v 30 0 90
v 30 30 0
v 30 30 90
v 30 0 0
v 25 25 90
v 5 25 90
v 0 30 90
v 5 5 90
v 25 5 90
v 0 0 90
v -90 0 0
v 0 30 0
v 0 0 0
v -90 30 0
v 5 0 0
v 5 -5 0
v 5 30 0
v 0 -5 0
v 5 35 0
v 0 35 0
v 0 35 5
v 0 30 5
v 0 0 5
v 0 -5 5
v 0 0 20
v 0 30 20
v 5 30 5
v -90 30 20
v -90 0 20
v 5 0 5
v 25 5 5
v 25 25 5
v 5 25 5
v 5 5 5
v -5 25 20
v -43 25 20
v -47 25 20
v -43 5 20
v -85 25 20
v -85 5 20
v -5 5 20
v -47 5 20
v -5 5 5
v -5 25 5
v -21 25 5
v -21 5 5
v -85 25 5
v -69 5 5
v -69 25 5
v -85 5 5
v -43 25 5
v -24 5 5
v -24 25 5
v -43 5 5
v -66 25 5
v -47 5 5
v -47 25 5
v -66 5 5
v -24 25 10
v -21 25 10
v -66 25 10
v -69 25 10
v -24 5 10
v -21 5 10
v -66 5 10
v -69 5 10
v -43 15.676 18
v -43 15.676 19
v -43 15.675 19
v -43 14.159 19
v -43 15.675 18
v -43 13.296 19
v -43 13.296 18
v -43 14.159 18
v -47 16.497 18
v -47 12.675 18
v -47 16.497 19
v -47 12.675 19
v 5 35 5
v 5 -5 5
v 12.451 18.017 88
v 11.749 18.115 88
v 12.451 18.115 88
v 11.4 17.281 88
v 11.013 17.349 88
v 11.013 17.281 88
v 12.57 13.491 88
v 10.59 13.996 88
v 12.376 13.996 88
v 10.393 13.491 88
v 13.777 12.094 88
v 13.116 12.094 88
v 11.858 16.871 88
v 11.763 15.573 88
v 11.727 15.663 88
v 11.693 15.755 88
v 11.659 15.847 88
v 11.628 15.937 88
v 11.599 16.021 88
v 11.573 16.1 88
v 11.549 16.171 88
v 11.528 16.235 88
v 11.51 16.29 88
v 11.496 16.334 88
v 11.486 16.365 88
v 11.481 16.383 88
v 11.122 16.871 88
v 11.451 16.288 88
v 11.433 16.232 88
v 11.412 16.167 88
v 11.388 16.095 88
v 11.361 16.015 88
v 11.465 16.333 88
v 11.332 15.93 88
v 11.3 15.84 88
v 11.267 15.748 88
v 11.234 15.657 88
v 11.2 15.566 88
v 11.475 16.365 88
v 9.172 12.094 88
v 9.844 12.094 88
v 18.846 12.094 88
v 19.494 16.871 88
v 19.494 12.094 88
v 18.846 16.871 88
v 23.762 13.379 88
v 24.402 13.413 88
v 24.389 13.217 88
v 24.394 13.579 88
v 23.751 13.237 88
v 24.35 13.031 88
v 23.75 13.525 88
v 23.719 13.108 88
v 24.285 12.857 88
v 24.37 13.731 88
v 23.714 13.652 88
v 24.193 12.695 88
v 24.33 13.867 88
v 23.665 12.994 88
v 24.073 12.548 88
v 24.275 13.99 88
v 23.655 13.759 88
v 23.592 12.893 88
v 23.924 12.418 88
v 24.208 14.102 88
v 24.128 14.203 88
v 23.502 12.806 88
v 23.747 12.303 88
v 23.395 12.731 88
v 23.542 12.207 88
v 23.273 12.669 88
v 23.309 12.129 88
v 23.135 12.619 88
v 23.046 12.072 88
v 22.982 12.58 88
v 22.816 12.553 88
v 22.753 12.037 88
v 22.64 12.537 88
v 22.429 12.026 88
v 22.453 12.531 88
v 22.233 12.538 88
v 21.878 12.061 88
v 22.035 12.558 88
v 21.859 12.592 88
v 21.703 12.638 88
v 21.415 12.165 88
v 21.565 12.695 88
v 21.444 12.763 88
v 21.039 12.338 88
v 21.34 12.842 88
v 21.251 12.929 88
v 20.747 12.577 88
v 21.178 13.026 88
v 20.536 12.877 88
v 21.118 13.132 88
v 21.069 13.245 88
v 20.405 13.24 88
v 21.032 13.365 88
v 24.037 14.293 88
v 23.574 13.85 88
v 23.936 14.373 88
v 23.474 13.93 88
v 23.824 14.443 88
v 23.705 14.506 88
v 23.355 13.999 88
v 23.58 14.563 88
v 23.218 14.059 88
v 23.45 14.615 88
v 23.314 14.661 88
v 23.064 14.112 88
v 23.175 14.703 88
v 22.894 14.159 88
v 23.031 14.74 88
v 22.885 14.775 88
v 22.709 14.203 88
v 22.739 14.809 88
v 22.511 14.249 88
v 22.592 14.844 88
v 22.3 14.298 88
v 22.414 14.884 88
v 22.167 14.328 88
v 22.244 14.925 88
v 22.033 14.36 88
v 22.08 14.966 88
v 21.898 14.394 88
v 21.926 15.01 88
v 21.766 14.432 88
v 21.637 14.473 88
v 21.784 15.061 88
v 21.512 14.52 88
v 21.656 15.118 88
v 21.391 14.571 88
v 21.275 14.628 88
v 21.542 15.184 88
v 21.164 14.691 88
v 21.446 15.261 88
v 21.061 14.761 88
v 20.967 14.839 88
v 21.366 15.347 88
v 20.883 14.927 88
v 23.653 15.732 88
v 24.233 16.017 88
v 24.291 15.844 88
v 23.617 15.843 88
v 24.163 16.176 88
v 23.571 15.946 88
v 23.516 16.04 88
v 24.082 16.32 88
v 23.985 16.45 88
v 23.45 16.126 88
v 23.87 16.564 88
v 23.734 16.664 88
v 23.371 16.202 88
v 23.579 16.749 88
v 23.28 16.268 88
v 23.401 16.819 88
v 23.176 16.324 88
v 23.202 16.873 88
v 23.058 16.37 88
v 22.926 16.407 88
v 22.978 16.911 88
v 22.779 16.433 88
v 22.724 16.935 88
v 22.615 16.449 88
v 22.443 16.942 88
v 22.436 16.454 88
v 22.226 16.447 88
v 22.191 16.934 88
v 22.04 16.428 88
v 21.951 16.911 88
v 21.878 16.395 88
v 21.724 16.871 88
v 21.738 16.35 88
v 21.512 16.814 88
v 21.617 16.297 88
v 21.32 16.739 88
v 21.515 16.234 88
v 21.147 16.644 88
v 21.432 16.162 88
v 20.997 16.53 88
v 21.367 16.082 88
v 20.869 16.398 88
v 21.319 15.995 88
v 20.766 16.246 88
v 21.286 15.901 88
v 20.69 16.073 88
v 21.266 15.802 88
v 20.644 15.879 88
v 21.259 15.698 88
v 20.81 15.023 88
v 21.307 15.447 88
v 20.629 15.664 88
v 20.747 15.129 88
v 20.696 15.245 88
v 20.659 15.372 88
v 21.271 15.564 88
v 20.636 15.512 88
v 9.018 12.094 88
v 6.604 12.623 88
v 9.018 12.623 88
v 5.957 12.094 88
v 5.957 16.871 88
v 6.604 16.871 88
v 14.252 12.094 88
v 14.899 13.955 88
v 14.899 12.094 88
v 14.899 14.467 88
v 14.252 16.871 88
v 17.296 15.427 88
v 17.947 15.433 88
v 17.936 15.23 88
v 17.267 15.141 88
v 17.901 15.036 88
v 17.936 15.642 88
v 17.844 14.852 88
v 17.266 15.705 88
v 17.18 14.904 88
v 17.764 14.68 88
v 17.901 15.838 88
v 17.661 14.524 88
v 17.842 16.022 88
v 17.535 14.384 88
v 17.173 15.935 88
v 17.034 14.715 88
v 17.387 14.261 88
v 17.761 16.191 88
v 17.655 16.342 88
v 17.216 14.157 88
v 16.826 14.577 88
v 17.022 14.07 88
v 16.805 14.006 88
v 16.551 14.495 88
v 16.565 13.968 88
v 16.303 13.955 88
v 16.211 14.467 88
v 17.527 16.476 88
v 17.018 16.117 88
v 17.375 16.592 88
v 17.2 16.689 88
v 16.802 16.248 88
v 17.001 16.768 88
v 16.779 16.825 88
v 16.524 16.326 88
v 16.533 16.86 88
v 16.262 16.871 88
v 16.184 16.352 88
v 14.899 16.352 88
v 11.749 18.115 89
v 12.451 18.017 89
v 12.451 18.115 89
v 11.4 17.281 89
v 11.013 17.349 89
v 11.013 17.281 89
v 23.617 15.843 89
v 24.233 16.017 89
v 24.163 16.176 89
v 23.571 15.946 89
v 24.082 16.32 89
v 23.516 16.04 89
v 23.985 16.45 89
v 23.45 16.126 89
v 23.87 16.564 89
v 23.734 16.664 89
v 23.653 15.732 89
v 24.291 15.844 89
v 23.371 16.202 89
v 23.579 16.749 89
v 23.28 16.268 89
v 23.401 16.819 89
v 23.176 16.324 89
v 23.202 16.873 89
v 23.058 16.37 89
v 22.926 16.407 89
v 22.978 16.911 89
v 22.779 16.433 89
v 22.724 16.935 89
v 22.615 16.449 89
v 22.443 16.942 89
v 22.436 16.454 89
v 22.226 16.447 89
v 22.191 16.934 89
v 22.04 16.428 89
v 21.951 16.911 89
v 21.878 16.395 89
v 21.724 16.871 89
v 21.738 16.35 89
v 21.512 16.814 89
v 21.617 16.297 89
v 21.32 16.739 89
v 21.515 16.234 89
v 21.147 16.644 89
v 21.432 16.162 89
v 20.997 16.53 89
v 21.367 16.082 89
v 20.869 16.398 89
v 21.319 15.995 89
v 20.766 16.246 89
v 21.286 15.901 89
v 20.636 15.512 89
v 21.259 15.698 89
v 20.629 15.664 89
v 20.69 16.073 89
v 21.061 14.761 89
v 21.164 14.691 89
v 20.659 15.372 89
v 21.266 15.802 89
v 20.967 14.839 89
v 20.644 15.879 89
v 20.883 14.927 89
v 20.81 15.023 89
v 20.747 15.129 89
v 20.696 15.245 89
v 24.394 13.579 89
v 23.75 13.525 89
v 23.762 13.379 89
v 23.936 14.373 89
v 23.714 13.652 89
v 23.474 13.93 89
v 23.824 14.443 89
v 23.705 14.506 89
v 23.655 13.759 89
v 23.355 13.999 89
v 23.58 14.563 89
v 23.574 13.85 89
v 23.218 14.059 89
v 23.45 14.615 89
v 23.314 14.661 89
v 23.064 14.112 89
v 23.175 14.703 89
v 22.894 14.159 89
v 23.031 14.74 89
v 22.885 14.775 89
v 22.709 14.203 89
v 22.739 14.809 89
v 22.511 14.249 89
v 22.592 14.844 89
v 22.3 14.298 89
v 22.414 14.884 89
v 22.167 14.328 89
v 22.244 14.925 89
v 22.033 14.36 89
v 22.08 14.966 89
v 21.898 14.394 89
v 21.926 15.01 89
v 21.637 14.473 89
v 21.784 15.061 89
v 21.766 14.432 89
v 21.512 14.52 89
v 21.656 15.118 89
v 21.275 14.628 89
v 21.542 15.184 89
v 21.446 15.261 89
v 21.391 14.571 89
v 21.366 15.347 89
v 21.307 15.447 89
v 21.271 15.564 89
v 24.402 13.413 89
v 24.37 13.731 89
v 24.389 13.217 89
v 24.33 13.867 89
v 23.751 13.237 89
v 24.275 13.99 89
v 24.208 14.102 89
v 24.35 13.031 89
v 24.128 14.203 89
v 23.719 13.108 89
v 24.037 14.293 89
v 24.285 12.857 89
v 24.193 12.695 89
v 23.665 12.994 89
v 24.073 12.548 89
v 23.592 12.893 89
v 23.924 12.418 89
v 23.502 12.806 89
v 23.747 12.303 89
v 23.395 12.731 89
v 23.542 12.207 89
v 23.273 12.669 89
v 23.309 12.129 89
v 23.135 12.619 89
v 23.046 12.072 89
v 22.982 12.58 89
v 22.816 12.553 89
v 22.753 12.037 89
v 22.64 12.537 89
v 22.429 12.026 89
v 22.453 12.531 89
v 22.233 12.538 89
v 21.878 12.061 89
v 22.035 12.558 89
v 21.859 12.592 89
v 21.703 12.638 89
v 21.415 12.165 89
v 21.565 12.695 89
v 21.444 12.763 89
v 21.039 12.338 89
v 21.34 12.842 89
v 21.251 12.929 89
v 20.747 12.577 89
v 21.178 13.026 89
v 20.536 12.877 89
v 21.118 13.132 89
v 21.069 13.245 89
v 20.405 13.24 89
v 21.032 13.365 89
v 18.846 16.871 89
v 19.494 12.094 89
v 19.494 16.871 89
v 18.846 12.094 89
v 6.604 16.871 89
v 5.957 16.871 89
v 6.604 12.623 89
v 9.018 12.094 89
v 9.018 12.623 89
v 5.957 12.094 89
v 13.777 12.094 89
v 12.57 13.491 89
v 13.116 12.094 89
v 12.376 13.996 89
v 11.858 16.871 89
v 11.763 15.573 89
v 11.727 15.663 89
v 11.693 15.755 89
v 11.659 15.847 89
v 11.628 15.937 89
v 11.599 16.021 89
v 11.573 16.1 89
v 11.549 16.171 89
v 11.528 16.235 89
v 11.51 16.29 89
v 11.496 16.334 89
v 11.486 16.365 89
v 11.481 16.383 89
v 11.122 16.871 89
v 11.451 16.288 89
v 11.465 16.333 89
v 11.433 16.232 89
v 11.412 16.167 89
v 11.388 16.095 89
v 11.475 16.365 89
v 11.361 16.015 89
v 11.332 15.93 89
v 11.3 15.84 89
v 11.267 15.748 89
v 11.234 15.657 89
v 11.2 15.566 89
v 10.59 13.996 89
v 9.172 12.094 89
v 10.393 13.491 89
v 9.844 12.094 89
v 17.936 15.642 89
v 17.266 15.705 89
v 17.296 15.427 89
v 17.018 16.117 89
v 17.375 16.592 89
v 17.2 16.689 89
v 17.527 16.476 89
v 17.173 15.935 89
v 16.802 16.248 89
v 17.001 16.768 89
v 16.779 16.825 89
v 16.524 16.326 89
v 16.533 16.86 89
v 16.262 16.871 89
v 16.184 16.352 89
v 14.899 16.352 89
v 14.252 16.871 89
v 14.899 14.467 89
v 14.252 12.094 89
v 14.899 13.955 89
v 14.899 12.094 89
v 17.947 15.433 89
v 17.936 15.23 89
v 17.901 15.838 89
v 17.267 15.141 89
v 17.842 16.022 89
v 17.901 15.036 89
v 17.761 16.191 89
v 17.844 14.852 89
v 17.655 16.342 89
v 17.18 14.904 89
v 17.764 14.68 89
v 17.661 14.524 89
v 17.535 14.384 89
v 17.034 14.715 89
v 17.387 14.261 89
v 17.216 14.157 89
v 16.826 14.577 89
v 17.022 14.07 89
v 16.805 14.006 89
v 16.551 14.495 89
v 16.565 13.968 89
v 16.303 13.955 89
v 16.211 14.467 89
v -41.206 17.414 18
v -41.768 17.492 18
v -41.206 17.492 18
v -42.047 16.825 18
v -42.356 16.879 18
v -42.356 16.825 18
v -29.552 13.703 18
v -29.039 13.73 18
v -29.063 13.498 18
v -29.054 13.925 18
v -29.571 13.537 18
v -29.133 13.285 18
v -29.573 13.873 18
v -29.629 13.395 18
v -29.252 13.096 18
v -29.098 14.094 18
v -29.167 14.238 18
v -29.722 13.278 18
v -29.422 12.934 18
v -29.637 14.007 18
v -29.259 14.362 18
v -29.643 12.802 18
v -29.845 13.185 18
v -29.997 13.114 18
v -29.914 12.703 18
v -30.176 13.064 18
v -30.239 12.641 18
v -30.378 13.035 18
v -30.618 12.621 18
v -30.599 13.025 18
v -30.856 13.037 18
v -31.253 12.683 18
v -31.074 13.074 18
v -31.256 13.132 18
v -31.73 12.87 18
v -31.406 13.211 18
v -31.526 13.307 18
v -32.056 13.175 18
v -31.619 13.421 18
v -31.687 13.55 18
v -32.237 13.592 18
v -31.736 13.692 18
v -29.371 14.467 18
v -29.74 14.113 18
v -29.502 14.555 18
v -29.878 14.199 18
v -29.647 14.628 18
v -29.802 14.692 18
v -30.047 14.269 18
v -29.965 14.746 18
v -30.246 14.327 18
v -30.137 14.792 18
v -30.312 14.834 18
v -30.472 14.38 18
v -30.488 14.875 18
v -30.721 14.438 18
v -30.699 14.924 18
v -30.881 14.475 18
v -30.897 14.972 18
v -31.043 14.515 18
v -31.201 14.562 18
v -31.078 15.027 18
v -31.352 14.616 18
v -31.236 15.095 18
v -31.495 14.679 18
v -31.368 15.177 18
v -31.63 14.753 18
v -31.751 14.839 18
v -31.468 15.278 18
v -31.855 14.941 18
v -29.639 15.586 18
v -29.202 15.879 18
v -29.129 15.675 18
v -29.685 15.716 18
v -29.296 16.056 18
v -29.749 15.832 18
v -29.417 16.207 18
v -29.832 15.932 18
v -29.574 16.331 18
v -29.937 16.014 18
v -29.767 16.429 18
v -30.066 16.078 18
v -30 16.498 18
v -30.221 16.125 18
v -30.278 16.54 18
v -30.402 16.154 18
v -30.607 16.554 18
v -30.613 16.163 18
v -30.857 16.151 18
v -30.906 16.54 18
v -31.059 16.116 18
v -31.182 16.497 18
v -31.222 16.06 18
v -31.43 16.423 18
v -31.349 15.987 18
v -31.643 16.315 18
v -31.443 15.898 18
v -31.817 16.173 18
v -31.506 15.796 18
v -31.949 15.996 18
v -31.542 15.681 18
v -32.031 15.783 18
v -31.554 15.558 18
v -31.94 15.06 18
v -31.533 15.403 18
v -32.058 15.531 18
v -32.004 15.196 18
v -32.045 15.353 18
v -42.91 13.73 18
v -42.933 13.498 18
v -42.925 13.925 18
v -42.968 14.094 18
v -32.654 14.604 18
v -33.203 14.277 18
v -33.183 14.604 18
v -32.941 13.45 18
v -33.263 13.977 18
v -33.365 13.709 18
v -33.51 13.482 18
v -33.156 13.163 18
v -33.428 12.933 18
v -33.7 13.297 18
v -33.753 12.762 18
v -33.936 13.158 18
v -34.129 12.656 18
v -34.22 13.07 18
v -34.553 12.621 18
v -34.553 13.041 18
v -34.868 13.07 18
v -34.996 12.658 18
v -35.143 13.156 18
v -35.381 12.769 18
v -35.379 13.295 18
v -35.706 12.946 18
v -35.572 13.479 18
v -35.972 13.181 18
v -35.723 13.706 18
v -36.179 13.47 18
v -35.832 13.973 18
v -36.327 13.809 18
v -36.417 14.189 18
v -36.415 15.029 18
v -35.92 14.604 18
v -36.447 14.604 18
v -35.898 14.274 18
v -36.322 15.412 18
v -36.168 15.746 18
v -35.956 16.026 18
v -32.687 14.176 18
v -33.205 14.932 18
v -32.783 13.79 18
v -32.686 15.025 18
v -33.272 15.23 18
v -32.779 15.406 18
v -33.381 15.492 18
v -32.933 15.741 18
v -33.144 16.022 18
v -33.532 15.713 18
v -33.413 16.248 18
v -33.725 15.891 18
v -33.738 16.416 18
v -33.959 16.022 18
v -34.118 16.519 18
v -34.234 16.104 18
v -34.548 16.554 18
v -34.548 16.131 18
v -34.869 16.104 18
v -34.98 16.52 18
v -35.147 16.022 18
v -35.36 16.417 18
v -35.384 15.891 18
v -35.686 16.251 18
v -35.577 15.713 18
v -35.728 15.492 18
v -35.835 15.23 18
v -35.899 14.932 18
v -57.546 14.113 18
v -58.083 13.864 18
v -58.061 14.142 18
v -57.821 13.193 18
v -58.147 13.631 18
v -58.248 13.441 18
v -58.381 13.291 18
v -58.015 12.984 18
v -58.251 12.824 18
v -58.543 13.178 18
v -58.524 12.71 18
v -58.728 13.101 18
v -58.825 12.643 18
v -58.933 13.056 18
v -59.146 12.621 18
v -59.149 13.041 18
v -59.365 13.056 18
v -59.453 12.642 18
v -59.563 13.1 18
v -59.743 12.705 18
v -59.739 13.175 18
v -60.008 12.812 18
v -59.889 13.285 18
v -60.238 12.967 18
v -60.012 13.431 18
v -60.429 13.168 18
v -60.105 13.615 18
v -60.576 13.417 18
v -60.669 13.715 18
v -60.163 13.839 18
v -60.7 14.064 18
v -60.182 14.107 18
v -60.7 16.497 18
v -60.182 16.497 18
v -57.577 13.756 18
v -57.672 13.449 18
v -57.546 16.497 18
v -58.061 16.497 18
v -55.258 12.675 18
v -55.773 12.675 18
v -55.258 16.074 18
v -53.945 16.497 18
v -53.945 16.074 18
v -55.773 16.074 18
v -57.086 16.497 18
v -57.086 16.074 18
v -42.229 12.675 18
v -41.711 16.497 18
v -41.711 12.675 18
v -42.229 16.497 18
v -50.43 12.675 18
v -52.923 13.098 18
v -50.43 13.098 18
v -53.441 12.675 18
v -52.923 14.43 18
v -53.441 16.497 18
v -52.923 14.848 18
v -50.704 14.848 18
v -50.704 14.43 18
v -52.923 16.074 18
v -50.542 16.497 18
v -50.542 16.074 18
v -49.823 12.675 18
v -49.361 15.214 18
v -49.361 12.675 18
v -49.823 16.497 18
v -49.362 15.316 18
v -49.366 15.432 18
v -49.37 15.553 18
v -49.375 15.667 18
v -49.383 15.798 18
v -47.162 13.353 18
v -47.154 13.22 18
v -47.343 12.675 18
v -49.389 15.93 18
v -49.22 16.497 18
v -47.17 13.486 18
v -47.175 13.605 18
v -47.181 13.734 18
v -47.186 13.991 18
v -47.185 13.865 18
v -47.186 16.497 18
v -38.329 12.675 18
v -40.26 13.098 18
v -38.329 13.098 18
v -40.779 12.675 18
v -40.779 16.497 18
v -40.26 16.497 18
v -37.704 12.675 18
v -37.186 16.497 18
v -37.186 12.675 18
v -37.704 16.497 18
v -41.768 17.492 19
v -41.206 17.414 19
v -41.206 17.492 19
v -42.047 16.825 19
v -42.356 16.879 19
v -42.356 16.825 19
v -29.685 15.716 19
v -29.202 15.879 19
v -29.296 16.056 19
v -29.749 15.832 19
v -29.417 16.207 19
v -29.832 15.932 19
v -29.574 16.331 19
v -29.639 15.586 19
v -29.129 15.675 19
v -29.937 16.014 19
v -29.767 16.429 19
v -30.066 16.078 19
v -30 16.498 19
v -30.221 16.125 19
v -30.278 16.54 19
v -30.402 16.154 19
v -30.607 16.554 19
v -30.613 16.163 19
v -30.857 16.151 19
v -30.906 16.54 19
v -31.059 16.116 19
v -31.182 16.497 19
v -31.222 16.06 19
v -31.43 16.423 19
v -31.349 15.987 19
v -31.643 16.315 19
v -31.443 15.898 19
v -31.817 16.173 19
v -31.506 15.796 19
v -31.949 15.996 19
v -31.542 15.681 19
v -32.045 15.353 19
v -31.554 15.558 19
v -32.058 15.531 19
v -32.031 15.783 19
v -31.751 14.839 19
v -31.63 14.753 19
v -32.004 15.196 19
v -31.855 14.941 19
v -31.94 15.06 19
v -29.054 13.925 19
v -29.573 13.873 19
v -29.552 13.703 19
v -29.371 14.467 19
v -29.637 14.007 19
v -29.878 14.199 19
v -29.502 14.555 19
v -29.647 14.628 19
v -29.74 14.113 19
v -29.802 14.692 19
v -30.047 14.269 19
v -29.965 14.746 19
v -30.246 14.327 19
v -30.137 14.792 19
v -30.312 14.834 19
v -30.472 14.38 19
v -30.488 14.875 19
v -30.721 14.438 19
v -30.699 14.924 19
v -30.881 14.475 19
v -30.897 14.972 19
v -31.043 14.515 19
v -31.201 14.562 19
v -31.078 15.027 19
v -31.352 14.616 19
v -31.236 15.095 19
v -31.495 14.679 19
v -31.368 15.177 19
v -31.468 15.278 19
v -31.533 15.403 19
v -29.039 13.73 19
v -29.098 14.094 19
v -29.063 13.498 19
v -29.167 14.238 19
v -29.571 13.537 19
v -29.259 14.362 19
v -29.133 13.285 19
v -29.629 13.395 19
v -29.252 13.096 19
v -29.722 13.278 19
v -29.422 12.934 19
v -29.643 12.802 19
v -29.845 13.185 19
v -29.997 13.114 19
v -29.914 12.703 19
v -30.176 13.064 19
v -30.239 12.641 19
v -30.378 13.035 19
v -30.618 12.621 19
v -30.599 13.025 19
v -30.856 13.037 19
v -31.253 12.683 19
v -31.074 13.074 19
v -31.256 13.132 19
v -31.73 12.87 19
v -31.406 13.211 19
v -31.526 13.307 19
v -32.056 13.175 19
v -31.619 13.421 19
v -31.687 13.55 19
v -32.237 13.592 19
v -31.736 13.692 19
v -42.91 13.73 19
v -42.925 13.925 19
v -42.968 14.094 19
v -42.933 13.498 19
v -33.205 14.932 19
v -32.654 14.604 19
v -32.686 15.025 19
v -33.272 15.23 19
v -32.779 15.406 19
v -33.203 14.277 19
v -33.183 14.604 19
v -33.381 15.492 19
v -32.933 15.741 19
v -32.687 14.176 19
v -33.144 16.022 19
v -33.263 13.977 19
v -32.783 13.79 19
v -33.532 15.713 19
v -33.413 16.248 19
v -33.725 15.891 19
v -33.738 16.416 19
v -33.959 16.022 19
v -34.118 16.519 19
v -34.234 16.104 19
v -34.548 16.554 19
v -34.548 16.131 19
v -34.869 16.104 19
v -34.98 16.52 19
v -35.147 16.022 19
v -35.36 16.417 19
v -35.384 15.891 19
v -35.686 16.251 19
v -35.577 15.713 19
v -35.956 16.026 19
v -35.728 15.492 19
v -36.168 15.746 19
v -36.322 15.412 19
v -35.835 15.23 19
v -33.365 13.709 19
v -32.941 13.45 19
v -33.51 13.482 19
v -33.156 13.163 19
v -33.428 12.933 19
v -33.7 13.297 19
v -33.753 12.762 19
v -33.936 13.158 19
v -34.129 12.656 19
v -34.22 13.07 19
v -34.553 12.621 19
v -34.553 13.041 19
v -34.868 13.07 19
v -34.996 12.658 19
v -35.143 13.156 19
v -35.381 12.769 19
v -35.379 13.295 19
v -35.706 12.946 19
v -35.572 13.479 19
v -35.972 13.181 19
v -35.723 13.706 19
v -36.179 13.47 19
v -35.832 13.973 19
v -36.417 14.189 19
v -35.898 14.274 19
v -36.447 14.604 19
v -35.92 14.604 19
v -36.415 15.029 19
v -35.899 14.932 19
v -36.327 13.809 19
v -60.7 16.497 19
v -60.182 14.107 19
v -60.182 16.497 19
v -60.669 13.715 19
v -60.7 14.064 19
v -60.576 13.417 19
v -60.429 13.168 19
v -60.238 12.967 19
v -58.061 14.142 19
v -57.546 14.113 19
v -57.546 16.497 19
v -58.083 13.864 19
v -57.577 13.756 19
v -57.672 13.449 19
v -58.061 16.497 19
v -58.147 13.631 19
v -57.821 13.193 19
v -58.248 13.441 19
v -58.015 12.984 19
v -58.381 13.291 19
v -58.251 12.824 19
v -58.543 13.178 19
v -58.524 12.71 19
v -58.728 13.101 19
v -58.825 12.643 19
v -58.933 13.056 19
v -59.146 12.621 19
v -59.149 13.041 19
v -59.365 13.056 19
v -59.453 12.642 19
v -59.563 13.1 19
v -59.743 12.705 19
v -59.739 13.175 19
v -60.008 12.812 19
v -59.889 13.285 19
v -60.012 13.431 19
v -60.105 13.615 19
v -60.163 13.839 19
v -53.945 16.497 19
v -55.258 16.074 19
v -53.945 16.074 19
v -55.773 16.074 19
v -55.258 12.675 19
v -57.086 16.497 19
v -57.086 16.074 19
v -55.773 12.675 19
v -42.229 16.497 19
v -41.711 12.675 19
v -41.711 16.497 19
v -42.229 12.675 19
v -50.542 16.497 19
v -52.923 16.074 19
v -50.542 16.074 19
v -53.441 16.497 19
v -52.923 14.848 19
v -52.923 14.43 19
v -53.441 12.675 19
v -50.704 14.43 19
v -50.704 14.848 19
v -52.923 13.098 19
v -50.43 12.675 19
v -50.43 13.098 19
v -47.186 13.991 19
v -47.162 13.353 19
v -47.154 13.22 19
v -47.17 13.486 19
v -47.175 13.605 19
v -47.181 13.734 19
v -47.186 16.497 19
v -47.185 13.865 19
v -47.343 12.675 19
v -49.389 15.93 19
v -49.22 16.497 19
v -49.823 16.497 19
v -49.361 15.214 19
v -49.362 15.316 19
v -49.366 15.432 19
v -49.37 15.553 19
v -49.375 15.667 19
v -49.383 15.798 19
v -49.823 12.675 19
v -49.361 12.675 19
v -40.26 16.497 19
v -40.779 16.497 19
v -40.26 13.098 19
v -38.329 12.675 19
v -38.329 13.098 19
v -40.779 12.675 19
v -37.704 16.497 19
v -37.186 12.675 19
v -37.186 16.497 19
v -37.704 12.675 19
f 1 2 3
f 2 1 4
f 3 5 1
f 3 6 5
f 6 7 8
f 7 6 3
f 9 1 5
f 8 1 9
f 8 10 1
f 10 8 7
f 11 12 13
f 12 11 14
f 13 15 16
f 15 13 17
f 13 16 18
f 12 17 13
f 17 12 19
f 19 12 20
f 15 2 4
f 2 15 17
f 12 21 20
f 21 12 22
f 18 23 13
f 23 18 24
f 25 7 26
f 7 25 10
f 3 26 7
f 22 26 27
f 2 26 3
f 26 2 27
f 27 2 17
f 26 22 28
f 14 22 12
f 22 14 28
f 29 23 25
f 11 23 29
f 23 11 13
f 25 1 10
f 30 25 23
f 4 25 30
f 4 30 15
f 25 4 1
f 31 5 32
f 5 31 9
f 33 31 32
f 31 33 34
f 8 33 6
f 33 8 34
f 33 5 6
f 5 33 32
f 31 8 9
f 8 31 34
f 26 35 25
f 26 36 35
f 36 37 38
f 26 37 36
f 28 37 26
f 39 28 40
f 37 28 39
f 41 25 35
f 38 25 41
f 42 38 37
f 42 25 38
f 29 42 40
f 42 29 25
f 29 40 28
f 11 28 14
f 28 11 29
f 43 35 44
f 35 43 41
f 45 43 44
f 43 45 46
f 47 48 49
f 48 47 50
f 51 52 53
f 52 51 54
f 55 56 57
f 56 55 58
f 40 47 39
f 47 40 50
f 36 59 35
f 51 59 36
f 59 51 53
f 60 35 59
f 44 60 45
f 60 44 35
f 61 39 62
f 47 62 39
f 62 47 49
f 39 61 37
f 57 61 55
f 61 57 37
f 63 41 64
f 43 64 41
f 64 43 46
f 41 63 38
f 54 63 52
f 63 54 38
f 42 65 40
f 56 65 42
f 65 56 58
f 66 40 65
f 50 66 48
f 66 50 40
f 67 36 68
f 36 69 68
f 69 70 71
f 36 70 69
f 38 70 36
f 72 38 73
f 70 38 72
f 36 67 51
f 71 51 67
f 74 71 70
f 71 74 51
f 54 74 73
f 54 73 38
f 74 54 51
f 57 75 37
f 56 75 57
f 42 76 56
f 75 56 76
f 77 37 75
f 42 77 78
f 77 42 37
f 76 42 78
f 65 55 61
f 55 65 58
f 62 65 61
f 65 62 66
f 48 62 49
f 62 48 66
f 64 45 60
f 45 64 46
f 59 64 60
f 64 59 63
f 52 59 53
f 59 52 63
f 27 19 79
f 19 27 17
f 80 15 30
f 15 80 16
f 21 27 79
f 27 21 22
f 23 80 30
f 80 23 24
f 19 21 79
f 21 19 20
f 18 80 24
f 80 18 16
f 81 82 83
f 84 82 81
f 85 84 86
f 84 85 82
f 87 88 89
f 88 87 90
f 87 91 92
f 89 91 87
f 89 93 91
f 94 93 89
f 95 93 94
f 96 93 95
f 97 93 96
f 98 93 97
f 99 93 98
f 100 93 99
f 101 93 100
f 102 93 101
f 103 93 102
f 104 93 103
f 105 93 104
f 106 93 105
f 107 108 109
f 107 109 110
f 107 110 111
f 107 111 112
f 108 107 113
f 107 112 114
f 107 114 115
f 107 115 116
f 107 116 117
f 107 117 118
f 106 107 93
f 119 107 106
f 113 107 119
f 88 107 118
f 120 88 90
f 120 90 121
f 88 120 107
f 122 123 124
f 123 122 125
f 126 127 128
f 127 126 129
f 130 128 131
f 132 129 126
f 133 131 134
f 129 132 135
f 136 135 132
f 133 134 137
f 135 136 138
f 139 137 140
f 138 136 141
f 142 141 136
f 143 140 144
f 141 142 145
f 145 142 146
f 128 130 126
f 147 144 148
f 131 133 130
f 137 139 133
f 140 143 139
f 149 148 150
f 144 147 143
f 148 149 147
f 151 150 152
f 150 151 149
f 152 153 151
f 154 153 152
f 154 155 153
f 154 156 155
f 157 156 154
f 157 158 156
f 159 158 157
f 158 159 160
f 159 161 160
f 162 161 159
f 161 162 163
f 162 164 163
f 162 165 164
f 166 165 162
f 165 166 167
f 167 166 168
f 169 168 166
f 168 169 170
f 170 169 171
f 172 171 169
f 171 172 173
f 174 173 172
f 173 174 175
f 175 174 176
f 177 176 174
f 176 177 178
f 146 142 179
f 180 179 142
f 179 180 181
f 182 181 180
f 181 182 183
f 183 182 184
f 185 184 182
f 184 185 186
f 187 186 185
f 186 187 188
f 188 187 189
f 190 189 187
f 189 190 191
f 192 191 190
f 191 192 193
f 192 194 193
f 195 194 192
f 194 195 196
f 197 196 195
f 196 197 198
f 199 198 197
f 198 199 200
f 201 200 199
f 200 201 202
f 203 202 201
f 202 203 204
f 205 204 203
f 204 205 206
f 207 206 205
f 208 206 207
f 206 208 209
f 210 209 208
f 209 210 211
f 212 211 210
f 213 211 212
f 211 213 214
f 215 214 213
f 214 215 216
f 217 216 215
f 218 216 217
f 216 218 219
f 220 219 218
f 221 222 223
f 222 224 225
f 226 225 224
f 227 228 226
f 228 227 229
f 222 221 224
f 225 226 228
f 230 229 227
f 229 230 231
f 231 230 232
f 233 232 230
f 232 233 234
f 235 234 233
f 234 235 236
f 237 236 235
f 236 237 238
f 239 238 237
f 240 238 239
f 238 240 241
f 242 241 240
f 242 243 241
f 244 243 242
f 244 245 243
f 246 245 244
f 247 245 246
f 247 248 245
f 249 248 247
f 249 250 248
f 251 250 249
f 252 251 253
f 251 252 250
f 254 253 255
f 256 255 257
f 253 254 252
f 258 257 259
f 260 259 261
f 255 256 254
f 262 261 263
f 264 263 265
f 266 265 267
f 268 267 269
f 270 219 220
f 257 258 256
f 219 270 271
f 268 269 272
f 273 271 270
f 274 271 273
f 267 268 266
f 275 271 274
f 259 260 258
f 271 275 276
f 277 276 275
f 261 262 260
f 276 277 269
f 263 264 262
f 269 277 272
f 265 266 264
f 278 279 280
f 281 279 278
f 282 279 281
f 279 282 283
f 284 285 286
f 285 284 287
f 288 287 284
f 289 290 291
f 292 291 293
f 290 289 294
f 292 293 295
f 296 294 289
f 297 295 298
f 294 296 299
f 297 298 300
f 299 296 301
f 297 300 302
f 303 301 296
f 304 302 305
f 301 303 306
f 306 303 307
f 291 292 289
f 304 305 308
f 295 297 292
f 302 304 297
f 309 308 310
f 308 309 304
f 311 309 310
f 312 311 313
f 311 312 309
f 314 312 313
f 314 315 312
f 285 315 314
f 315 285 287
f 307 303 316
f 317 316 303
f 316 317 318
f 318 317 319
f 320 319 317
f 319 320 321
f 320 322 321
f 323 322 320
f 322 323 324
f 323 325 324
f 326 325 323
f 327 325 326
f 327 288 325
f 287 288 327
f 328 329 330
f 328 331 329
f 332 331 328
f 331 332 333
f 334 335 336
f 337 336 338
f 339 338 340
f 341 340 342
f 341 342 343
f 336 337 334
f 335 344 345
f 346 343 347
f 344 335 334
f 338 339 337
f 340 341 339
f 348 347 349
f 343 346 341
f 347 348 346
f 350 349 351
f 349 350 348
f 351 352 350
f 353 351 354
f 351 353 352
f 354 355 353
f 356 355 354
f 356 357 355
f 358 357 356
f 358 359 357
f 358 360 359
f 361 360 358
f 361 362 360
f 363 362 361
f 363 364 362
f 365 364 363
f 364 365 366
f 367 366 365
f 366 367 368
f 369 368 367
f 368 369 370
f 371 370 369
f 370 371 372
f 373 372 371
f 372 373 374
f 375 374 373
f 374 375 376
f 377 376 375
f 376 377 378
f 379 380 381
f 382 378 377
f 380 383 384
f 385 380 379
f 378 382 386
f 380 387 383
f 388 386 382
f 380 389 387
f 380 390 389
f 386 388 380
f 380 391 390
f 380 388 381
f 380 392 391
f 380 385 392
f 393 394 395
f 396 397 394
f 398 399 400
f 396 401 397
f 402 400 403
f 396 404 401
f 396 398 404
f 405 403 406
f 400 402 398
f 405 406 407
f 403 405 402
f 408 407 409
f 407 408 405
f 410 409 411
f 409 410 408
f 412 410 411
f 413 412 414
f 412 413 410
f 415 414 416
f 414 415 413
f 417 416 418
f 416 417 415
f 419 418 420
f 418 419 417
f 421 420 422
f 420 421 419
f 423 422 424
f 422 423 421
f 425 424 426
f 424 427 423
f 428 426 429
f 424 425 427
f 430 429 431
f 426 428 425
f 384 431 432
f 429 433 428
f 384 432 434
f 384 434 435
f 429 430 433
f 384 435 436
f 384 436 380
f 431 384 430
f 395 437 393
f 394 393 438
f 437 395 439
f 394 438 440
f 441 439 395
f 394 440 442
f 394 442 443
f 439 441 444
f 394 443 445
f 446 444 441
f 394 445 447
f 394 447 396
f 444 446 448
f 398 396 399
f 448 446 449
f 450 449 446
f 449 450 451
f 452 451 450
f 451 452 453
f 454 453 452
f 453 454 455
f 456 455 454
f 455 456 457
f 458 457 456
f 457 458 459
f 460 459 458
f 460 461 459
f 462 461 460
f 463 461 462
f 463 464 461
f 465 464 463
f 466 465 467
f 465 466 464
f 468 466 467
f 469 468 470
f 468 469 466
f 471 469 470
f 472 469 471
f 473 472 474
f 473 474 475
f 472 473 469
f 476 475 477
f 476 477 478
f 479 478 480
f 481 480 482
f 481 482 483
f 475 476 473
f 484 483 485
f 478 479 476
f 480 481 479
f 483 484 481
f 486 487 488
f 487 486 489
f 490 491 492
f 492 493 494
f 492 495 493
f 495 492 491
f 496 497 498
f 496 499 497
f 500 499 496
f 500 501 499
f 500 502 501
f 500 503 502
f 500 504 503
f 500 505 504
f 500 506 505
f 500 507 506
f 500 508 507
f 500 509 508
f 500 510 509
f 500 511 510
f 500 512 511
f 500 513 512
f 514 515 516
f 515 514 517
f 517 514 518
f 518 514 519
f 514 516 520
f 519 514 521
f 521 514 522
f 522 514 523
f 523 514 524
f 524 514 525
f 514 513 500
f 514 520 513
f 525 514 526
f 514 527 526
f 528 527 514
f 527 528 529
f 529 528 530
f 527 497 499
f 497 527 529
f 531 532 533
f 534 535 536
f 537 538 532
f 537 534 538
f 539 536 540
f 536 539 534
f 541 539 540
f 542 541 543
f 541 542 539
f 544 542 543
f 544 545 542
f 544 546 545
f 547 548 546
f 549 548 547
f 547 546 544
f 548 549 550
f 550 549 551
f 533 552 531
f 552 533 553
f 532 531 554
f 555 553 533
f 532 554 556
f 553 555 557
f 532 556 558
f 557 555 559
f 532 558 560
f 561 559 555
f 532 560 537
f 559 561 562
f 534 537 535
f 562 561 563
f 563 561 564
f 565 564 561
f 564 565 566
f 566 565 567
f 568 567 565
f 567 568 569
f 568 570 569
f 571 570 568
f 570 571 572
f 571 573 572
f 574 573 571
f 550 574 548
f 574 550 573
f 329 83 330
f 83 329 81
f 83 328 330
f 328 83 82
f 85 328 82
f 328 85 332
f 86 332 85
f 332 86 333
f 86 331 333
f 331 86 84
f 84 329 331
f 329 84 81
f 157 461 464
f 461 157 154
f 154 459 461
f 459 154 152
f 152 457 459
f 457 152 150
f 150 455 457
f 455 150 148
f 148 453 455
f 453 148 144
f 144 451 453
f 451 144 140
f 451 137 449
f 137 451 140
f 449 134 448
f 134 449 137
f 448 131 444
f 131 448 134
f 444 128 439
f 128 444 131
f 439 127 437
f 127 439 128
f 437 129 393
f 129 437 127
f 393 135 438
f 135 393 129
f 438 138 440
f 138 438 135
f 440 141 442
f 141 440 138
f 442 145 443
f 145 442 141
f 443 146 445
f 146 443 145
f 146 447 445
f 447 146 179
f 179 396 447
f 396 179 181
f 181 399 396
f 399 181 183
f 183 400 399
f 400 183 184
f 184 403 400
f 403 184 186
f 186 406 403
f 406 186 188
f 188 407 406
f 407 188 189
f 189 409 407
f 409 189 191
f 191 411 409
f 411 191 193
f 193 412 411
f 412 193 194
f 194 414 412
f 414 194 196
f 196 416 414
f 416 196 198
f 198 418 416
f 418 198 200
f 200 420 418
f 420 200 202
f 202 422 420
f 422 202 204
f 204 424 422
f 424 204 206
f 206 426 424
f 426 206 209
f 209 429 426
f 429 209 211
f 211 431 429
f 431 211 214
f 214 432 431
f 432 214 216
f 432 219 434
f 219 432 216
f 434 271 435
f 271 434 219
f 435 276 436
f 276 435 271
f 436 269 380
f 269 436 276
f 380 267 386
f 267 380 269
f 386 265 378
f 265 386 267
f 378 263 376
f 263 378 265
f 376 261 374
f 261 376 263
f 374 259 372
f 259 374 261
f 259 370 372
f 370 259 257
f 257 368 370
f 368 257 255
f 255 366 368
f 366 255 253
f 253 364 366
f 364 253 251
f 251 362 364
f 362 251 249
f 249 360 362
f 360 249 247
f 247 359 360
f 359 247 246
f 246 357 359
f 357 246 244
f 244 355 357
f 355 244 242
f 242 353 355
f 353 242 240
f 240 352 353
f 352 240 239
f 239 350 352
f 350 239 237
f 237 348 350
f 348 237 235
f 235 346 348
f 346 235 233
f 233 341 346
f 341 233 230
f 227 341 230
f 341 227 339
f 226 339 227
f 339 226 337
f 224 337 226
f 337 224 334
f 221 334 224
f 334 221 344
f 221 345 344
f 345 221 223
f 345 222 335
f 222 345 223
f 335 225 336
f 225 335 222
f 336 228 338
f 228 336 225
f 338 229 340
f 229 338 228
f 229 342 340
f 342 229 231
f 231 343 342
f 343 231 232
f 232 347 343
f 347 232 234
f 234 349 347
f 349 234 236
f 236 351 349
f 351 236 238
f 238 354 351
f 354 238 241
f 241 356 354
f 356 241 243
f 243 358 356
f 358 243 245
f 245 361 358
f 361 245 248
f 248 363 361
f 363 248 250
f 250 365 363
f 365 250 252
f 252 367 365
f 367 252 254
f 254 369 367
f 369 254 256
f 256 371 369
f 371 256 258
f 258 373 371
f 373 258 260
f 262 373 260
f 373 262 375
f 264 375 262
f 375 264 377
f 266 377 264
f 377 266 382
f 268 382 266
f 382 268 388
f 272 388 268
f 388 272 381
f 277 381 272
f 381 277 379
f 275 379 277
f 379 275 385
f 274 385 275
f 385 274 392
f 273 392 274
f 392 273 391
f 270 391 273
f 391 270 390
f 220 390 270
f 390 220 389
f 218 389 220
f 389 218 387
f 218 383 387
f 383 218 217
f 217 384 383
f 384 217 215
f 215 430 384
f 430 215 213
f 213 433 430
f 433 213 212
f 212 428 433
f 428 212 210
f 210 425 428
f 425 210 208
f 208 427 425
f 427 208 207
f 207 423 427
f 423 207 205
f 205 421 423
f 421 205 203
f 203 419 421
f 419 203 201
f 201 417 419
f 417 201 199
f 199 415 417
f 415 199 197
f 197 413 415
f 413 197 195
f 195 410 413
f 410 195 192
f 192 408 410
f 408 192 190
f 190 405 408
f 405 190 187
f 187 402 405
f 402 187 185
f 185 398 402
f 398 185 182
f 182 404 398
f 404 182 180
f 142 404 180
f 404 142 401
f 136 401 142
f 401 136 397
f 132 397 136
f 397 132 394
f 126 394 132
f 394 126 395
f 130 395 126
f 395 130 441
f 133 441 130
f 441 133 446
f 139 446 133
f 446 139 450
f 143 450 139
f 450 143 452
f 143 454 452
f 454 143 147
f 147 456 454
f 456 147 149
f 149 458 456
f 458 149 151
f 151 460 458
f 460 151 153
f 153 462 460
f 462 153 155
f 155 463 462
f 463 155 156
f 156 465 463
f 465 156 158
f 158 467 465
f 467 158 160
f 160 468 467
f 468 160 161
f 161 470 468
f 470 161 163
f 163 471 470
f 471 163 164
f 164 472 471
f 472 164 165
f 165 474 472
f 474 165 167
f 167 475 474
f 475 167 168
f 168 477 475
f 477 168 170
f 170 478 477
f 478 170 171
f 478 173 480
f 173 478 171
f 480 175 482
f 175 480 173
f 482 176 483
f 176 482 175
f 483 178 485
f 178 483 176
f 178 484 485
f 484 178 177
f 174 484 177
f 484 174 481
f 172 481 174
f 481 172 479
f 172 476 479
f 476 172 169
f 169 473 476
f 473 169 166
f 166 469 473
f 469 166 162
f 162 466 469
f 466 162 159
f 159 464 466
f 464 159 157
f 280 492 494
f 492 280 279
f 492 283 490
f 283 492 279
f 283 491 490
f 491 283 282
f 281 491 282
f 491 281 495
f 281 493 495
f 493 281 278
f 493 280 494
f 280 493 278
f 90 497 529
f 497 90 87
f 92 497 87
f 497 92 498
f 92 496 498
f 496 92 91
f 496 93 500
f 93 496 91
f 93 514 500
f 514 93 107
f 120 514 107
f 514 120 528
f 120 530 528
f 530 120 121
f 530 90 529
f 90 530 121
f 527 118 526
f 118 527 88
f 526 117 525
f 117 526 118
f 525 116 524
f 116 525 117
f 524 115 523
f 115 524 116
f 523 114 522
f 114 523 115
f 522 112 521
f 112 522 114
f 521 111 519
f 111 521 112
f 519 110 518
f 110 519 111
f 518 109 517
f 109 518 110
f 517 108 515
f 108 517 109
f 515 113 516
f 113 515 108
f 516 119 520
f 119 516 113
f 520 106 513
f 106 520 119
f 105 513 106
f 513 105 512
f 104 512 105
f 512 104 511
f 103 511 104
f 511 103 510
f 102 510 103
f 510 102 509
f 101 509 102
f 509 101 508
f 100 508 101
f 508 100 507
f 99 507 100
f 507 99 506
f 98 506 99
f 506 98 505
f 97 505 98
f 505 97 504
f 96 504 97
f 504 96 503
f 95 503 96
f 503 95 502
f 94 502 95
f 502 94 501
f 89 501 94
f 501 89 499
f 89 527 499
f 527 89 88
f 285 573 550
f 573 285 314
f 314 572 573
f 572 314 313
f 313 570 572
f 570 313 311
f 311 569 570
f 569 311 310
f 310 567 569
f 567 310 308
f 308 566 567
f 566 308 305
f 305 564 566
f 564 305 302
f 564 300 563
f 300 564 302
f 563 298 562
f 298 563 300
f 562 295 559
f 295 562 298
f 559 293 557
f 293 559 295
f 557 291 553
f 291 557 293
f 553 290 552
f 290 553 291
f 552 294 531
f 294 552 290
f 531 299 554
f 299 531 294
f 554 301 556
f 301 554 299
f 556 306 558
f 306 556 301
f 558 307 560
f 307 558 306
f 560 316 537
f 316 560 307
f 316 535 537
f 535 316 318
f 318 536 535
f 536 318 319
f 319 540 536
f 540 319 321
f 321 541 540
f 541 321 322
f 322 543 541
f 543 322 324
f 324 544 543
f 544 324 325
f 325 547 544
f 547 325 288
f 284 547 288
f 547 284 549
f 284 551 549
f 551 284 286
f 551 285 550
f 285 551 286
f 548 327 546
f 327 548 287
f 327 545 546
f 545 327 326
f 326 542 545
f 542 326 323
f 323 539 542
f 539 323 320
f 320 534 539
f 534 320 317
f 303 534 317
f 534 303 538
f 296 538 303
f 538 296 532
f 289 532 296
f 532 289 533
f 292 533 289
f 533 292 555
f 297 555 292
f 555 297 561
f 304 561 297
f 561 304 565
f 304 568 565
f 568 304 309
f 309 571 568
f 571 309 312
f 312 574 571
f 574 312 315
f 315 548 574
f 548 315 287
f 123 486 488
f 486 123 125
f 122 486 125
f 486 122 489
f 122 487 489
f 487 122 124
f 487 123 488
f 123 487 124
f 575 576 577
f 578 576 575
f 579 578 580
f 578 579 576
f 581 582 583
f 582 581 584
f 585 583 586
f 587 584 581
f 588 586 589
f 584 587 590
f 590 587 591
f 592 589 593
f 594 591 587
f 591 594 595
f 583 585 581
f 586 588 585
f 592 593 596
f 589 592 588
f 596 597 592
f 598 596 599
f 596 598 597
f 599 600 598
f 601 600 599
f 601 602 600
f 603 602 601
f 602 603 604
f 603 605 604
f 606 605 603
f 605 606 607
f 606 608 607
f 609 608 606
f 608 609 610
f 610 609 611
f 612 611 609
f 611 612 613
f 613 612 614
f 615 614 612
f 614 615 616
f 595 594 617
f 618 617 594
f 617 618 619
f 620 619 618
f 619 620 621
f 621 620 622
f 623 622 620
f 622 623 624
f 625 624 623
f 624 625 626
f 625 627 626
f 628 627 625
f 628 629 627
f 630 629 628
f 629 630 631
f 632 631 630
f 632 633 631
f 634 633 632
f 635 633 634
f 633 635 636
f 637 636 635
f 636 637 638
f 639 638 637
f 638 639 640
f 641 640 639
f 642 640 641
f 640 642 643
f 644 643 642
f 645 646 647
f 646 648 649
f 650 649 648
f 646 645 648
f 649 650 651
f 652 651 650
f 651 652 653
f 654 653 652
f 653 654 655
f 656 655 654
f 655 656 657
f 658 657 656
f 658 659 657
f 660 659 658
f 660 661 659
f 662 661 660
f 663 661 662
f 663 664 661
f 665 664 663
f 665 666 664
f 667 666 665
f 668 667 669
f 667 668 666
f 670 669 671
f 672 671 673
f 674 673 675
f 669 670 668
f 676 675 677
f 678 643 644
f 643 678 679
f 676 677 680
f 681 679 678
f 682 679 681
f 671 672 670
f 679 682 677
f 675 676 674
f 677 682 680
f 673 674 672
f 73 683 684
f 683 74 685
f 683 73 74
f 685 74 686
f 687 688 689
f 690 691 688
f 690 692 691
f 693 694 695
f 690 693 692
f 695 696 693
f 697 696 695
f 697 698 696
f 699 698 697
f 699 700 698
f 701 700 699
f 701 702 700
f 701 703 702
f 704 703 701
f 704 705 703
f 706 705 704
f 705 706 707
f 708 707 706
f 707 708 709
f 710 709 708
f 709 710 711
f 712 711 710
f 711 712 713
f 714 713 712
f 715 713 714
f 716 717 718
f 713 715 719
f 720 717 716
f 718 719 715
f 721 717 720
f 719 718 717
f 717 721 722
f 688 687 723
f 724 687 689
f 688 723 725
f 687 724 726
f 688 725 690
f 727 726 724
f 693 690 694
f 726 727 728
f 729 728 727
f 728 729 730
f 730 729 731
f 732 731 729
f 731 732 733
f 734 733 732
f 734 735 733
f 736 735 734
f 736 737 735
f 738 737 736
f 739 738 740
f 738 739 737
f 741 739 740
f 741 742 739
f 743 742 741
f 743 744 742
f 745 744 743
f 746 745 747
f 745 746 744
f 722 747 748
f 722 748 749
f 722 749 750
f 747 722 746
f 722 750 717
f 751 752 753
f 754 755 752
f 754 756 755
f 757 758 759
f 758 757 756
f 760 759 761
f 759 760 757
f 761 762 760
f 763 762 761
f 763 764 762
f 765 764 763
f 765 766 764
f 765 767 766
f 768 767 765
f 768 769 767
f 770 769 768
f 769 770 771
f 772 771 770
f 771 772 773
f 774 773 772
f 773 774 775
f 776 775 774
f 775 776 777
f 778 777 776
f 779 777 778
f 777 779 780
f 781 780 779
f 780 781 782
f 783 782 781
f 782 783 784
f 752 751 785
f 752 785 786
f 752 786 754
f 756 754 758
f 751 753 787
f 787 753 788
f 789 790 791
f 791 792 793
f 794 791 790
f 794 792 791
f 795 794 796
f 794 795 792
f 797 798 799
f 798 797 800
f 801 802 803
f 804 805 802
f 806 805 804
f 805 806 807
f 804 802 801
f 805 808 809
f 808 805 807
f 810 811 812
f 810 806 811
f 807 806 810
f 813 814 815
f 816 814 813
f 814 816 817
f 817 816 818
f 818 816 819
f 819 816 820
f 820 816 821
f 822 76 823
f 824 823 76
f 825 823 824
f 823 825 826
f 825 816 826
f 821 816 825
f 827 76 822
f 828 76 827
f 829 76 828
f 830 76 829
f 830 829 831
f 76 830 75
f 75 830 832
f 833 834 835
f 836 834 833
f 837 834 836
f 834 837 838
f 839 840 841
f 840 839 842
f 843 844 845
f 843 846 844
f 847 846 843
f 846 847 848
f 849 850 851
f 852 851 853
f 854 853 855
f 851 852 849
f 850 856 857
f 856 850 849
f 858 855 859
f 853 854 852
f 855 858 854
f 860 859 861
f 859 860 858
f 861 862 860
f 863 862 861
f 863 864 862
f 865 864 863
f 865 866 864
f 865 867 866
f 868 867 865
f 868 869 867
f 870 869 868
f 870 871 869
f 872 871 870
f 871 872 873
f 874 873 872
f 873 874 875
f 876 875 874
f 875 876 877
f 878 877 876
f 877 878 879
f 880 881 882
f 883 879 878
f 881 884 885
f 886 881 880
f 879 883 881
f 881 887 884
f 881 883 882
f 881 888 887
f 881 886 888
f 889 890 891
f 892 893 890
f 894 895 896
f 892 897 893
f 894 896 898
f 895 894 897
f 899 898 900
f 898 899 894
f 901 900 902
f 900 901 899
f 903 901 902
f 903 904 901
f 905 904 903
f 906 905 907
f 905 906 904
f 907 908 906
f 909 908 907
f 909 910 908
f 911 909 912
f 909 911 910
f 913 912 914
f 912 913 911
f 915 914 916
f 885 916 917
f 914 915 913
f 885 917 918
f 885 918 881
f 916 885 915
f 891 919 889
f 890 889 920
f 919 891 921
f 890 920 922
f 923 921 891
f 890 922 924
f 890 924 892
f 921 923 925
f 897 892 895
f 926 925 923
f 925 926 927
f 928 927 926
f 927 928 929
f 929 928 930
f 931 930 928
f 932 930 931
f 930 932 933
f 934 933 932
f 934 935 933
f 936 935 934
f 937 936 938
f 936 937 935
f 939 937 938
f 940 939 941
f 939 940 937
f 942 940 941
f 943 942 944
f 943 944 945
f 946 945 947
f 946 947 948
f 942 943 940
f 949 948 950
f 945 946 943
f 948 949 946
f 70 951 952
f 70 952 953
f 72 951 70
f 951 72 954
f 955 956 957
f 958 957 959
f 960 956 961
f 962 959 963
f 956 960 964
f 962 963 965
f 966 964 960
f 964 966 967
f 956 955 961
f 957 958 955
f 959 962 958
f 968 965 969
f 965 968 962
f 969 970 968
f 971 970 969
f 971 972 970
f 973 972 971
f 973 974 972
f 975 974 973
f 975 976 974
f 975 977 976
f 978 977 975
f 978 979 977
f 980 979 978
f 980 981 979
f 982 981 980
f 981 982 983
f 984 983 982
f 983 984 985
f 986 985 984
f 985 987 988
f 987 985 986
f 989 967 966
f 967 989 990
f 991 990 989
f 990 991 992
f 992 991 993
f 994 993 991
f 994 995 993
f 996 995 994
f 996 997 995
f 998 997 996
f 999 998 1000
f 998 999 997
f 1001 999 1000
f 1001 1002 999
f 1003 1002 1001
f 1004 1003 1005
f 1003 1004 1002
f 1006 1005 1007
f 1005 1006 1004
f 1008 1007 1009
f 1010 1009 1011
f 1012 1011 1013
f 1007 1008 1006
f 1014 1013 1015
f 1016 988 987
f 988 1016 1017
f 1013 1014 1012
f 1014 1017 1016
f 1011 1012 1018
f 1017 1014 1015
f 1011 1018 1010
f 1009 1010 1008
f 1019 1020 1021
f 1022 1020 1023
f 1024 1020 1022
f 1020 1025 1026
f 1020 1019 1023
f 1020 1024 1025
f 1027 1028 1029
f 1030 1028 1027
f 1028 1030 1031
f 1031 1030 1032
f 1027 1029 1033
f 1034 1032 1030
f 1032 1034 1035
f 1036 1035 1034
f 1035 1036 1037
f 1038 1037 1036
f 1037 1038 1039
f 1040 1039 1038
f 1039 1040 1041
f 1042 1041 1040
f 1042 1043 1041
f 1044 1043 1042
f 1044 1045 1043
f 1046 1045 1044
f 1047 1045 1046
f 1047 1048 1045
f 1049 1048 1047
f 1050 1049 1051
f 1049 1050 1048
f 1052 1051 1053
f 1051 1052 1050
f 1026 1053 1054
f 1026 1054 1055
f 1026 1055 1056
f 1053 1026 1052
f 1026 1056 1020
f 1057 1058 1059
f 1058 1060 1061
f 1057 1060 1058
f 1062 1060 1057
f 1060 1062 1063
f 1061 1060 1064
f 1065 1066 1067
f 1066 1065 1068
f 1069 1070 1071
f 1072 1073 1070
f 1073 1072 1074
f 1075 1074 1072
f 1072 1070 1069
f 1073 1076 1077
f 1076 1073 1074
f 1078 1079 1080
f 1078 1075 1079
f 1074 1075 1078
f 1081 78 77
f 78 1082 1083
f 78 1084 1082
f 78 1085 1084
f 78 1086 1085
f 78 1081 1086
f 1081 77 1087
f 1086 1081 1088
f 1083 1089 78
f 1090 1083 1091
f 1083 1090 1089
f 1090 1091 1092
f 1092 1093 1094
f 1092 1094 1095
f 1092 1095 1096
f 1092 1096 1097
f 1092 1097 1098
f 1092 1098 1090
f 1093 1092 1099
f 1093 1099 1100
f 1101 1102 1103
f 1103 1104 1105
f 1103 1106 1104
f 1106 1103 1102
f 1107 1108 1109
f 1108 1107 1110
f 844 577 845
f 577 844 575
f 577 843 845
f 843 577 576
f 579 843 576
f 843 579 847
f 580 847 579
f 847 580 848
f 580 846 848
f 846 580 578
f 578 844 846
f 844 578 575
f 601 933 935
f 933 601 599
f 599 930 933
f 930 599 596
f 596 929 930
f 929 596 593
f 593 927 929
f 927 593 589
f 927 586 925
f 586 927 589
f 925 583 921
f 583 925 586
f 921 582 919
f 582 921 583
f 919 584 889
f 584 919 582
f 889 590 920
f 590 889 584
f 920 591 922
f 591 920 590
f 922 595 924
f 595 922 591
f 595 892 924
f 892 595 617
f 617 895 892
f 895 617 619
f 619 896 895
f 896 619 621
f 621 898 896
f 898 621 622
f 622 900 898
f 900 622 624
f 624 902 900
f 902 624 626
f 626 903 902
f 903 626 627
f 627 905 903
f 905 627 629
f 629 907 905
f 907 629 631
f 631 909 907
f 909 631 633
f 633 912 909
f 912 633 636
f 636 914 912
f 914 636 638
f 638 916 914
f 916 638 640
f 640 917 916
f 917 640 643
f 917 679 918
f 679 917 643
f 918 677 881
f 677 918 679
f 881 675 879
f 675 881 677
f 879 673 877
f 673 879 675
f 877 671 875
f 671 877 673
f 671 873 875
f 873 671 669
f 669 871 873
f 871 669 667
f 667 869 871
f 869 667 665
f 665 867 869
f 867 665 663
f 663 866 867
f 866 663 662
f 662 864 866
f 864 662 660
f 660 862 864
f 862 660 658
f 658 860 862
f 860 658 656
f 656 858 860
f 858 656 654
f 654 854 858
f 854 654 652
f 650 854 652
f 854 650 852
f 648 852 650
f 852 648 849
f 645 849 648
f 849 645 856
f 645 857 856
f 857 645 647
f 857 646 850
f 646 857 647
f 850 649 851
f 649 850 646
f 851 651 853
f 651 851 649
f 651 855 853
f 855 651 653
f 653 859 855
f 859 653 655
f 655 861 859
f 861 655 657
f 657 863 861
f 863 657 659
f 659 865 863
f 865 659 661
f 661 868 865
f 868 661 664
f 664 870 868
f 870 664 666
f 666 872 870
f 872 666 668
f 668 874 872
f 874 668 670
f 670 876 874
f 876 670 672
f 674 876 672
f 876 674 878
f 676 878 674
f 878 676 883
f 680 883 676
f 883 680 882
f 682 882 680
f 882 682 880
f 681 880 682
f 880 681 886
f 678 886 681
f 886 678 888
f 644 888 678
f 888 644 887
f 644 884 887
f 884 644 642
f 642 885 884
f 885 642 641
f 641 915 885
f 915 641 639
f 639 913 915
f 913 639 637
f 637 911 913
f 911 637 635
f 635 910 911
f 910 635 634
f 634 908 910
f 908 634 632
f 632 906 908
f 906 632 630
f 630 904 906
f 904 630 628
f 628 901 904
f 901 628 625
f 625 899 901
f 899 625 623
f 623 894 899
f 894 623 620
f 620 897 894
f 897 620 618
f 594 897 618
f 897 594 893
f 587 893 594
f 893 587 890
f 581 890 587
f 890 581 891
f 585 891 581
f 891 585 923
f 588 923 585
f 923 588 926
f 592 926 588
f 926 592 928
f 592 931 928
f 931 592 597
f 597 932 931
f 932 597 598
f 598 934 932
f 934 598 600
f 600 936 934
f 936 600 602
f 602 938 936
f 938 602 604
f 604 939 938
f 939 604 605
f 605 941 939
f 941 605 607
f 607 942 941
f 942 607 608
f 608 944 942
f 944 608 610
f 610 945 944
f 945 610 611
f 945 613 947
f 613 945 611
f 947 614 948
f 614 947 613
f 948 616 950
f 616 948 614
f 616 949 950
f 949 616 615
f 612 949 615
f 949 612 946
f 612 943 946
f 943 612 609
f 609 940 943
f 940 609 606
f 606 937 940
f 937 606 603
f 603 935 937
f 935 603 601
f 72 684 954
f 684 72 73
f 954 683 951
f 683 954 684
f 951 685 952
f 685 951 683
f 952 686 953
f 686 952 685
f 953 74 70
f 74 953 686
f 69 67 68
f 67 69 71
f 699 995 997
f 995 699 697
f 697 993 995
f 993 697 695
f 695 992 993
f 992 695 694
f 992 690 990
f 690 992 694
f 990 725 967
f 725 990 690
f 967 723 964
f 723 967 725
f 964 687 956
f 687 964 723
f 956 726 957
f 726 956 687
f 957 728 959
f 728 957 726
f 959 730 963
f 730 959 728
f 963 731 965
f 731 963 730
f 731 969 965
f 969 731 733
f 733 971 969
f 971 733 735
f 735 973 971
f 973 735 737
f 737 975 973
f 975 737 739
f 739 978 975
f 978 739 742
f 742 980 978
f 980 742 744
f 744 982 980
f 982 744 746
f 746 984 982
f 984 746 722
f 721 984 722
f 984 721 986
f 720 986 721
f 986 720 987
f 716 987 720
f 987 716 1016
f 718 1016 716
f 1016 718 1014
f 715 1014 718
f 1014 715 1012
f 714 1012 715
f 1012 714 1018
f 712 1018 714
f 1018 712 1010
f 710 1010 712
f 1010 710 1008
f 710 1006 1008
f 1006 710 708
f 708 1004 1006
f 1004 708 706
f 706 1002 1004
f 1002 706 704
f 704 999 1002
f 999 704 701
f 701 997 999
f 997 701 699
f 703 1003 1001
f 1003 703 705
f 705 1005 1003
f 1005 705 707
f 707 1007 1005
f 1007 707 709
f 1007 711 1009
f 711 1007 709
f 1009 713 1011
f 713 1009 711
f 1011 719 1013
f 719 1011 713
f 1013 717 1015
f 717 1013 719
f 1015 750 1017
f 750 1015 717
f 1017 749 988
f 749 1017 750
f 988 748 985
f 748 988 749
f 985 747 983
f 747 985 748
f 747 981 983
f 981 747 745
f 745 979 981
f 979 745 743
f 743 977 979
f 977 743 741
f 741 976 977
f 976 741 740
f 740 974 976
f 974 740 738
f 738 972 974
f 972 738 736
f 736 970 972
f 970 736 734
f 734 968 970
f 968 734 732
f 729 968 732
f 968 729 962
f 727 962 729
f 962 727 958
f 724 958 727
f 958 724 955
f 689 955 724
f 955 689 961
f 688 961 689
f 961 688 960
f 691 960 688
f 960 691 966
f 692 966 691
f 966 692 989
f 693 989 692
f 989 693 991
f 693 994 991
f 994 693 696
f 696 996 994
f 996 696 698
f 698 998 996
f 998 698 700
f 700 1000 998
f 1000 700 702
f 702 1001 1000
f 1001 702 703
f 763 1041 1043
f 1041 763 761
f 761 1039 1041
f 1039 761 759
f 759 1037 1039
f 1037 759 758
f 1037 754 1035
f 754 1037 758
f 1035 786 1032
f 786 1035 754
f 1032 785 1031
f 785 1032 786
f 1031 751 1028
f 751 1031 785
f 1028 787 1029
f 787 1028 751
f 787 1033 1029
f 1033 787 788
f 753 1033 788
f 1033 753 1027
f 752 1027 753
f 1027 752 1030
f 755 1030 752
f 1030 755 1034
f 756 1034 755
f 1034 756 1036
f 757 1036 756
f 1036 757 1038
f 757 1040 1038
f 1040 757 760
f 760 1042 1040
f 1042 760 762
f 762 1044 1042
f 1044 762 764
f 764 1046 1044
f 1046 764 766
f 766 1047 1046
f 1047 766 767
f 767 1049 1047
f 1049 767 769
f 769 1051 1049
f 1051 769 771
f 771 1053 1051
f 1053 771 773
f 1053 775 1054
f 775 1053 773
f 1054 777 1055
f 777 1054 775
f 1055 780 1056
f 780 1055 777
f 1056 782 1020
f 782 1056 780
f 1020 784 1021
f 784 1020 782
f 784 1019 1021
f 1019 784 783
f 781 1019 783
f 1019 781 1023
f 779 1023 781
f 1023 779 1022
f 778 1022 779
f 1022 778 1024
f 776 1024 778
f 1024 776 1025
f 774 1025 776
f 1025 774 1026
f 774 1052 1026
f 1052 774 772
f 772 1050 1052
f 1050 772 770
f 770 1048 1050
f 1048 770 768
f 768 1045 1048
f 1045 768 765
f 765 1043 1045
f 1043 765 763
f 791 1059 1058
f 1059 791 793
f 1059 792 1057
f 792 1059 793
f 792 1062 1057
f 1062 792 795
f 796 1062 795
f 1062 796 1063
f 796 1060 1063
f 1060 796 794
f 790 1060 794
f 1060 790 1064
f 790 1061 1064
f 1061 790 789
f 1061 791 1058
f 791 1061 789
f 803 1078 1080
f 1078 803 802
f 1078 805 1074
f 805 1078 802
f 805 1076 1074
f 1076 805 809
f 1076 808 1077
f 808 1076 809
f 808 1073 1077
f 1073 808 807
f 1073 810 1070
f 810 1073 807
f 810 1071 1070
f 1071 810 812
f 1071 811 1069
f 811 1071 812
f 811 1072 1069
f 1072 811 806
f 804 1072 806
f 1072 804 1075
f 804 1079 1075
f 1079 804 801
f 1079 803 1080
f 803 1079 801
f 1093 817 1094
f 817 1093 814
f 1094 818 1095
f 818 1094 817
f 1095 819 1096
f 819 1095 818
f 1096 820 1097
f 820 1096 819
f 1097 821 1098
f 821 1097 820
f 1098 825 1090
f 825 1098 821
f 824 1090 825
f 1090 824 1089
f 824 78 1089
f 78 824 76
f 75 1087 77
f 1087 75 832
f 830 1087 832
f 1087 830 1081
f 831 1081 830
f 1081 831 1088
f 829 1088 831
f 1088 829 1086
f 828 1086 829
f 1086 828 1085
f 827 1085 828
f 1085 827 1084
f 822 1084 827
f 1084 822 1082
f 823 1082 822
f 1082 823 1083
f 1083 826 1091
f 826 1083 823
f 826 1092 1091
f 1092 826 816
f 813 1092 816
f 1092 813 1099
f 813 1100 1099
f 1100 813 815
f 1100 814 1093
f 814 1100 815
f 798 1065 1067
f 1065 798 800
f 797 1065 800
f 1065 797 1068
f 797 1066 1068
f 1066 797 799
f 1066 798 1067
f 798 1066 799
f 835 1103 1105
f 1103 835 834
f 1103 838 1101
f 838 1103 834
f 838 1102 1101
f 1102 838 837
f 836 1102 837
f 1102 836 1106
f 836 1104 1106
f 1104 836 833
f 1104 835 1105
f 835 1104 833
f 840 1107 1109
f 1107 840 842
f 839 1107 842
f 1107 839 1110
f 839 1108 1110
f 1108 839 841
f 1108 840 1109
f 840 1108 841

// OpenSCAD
// PORTA LÁPIS E CANETAS COM TABULEIRO
// Configurações principais

// Dimensões da caixa de lápis
altura_caixa = 90;
largura_caixa = 30;
comprimento_caixa = 30;
espessura = 5;

// Dimensões do tabuleiro
comprimento_tabuleiro = 90;
largura_tabuleiro = 30;
altura_tabuleiro = 20;

// ========== MÓDULOS PRINCIPAIS ==========

// Caixa principal para lápis e canetas
module caixa_lapis() {
    difference() {
        // Caixa externa
        cube([comprimento_caixa, largura_caixa, altura_caixa]);
        
        // Vão interno (com folga de 5mm das bordas)
        translate([espessura, espessura, espessura])
        cube([
            comprimento_caixa - 2*espessura, 
            largura_caixa - 2*espessura, 
            altura_caixa - espessura + 1
        ]);
    }
}

// Tabuleiro para clips, agrafos e elásticos
module tabuleiro() {
    difference() {
        // Base do tabuleiro
        cube([comprimento_tabuleiro, largura_tabuleiro, altura_tabuleiro]);
        
        // Vão interno do tabuleiro
        translate([espessura, espessura, espessura])
        cube([
            comprimento_tabuleiro - 2*espessura,
            largura_tabuleiro - 2*espessura,
            altura_tabuleiro - espessura + 1
        ]);
    }
    
    // Divisórias internas do tabuleiro
    // Divisória central
    translate([comprimento_tabuleiro/2 - 2, 0, 0])
    cube([4, largura_tabuleiro, altura_tabuleiro]);
    
    // Divisórias menores
    translate([comprimento_tabuleiro/4 - 1.5, 0, 0])
    cube([3, largura_tabuleiro, altura_tabuleiro/2]);
    
    translate([3*comprimento_tabuleiro/4 - 1.5, 0, 0])
    cube([3, largura_tabuleiro, altura_tabuleiro/2]);
}

// Base de união entre caixa e tabuleiro
module base_uniao() {
    translate([0, -espessura, 0])
    cube([espessura, largura_caixa + 2*espessura, espessura]);
}

// ========== MONTAGEM FINAL ==========
union() {
    // Caixa de lápis (posição inicial)
    caixa_lapis();
    
    // Base de união
    base_uniao();
    
    // Tabuleiro (posicionado ao lado da caixa)
    translate([-comprimento_tabuleiro, 0, 0])
    tabuleiro();
}

// ========== DECORAÇÃO/IDENTIFICAÇÃO ==========
// Texto "Lápis" na caixa
translate([comprimento_caixa/2, largura_caixa/2, altura_caixa - 2])
linear_extrude(height = 1)
text("LÁPIS", size = 5, halign = "center", valign = "center");

// Texto "Utensílios" no tabuleiro
translate([-comprimento_tabuleiro/2, largura_tabuleiro/2, altura_tabuleiro - 2])
linear_extrude(height = 1)
text("UTENSÍLIOS", size = 4, halign = "center", valign = "center");

// ========== VISUALIZAÇÃO DOS COMPARTIMENTOS ==========
// Visualização dos itens (opcional - remova o % para ver)
%translate([comprimento_caixa/2, largura_caixa/2, altura_caixa/2])
rotate([0, 0, 90])
color("Yellow", 0.3)
cylinder(h = 70, r = 3, $fn = 30);

%translate([-comprimento_tabuleiro/2, largura_tabuleiro/3, altura_tabuleiro/2])
color("Silver", 0.5)
cube([10, 1, 5], center = true);

%translate([-comprimento_tabuleiro/2, 2*largura_tabuleiro/3, altura_tabuleiro/2])
color("Gold", 0.5)
cube([8, 2, 3], center = true);

/*
INSTRUÇÕES DE USO:
1. Renderize (F6) e exporte como STL
2. Imprima com a base na cama de impressão
3. Use preenchimento de 15-20%

PERSONALIZAÇÕES:
- Ajuste 'altura_caixa' para mais/menos lápis
- Modifique 'comprimento_tabuleiro' para mais divisórias
- Altere 'espessura' para paredes mais finas/espessas
*/
